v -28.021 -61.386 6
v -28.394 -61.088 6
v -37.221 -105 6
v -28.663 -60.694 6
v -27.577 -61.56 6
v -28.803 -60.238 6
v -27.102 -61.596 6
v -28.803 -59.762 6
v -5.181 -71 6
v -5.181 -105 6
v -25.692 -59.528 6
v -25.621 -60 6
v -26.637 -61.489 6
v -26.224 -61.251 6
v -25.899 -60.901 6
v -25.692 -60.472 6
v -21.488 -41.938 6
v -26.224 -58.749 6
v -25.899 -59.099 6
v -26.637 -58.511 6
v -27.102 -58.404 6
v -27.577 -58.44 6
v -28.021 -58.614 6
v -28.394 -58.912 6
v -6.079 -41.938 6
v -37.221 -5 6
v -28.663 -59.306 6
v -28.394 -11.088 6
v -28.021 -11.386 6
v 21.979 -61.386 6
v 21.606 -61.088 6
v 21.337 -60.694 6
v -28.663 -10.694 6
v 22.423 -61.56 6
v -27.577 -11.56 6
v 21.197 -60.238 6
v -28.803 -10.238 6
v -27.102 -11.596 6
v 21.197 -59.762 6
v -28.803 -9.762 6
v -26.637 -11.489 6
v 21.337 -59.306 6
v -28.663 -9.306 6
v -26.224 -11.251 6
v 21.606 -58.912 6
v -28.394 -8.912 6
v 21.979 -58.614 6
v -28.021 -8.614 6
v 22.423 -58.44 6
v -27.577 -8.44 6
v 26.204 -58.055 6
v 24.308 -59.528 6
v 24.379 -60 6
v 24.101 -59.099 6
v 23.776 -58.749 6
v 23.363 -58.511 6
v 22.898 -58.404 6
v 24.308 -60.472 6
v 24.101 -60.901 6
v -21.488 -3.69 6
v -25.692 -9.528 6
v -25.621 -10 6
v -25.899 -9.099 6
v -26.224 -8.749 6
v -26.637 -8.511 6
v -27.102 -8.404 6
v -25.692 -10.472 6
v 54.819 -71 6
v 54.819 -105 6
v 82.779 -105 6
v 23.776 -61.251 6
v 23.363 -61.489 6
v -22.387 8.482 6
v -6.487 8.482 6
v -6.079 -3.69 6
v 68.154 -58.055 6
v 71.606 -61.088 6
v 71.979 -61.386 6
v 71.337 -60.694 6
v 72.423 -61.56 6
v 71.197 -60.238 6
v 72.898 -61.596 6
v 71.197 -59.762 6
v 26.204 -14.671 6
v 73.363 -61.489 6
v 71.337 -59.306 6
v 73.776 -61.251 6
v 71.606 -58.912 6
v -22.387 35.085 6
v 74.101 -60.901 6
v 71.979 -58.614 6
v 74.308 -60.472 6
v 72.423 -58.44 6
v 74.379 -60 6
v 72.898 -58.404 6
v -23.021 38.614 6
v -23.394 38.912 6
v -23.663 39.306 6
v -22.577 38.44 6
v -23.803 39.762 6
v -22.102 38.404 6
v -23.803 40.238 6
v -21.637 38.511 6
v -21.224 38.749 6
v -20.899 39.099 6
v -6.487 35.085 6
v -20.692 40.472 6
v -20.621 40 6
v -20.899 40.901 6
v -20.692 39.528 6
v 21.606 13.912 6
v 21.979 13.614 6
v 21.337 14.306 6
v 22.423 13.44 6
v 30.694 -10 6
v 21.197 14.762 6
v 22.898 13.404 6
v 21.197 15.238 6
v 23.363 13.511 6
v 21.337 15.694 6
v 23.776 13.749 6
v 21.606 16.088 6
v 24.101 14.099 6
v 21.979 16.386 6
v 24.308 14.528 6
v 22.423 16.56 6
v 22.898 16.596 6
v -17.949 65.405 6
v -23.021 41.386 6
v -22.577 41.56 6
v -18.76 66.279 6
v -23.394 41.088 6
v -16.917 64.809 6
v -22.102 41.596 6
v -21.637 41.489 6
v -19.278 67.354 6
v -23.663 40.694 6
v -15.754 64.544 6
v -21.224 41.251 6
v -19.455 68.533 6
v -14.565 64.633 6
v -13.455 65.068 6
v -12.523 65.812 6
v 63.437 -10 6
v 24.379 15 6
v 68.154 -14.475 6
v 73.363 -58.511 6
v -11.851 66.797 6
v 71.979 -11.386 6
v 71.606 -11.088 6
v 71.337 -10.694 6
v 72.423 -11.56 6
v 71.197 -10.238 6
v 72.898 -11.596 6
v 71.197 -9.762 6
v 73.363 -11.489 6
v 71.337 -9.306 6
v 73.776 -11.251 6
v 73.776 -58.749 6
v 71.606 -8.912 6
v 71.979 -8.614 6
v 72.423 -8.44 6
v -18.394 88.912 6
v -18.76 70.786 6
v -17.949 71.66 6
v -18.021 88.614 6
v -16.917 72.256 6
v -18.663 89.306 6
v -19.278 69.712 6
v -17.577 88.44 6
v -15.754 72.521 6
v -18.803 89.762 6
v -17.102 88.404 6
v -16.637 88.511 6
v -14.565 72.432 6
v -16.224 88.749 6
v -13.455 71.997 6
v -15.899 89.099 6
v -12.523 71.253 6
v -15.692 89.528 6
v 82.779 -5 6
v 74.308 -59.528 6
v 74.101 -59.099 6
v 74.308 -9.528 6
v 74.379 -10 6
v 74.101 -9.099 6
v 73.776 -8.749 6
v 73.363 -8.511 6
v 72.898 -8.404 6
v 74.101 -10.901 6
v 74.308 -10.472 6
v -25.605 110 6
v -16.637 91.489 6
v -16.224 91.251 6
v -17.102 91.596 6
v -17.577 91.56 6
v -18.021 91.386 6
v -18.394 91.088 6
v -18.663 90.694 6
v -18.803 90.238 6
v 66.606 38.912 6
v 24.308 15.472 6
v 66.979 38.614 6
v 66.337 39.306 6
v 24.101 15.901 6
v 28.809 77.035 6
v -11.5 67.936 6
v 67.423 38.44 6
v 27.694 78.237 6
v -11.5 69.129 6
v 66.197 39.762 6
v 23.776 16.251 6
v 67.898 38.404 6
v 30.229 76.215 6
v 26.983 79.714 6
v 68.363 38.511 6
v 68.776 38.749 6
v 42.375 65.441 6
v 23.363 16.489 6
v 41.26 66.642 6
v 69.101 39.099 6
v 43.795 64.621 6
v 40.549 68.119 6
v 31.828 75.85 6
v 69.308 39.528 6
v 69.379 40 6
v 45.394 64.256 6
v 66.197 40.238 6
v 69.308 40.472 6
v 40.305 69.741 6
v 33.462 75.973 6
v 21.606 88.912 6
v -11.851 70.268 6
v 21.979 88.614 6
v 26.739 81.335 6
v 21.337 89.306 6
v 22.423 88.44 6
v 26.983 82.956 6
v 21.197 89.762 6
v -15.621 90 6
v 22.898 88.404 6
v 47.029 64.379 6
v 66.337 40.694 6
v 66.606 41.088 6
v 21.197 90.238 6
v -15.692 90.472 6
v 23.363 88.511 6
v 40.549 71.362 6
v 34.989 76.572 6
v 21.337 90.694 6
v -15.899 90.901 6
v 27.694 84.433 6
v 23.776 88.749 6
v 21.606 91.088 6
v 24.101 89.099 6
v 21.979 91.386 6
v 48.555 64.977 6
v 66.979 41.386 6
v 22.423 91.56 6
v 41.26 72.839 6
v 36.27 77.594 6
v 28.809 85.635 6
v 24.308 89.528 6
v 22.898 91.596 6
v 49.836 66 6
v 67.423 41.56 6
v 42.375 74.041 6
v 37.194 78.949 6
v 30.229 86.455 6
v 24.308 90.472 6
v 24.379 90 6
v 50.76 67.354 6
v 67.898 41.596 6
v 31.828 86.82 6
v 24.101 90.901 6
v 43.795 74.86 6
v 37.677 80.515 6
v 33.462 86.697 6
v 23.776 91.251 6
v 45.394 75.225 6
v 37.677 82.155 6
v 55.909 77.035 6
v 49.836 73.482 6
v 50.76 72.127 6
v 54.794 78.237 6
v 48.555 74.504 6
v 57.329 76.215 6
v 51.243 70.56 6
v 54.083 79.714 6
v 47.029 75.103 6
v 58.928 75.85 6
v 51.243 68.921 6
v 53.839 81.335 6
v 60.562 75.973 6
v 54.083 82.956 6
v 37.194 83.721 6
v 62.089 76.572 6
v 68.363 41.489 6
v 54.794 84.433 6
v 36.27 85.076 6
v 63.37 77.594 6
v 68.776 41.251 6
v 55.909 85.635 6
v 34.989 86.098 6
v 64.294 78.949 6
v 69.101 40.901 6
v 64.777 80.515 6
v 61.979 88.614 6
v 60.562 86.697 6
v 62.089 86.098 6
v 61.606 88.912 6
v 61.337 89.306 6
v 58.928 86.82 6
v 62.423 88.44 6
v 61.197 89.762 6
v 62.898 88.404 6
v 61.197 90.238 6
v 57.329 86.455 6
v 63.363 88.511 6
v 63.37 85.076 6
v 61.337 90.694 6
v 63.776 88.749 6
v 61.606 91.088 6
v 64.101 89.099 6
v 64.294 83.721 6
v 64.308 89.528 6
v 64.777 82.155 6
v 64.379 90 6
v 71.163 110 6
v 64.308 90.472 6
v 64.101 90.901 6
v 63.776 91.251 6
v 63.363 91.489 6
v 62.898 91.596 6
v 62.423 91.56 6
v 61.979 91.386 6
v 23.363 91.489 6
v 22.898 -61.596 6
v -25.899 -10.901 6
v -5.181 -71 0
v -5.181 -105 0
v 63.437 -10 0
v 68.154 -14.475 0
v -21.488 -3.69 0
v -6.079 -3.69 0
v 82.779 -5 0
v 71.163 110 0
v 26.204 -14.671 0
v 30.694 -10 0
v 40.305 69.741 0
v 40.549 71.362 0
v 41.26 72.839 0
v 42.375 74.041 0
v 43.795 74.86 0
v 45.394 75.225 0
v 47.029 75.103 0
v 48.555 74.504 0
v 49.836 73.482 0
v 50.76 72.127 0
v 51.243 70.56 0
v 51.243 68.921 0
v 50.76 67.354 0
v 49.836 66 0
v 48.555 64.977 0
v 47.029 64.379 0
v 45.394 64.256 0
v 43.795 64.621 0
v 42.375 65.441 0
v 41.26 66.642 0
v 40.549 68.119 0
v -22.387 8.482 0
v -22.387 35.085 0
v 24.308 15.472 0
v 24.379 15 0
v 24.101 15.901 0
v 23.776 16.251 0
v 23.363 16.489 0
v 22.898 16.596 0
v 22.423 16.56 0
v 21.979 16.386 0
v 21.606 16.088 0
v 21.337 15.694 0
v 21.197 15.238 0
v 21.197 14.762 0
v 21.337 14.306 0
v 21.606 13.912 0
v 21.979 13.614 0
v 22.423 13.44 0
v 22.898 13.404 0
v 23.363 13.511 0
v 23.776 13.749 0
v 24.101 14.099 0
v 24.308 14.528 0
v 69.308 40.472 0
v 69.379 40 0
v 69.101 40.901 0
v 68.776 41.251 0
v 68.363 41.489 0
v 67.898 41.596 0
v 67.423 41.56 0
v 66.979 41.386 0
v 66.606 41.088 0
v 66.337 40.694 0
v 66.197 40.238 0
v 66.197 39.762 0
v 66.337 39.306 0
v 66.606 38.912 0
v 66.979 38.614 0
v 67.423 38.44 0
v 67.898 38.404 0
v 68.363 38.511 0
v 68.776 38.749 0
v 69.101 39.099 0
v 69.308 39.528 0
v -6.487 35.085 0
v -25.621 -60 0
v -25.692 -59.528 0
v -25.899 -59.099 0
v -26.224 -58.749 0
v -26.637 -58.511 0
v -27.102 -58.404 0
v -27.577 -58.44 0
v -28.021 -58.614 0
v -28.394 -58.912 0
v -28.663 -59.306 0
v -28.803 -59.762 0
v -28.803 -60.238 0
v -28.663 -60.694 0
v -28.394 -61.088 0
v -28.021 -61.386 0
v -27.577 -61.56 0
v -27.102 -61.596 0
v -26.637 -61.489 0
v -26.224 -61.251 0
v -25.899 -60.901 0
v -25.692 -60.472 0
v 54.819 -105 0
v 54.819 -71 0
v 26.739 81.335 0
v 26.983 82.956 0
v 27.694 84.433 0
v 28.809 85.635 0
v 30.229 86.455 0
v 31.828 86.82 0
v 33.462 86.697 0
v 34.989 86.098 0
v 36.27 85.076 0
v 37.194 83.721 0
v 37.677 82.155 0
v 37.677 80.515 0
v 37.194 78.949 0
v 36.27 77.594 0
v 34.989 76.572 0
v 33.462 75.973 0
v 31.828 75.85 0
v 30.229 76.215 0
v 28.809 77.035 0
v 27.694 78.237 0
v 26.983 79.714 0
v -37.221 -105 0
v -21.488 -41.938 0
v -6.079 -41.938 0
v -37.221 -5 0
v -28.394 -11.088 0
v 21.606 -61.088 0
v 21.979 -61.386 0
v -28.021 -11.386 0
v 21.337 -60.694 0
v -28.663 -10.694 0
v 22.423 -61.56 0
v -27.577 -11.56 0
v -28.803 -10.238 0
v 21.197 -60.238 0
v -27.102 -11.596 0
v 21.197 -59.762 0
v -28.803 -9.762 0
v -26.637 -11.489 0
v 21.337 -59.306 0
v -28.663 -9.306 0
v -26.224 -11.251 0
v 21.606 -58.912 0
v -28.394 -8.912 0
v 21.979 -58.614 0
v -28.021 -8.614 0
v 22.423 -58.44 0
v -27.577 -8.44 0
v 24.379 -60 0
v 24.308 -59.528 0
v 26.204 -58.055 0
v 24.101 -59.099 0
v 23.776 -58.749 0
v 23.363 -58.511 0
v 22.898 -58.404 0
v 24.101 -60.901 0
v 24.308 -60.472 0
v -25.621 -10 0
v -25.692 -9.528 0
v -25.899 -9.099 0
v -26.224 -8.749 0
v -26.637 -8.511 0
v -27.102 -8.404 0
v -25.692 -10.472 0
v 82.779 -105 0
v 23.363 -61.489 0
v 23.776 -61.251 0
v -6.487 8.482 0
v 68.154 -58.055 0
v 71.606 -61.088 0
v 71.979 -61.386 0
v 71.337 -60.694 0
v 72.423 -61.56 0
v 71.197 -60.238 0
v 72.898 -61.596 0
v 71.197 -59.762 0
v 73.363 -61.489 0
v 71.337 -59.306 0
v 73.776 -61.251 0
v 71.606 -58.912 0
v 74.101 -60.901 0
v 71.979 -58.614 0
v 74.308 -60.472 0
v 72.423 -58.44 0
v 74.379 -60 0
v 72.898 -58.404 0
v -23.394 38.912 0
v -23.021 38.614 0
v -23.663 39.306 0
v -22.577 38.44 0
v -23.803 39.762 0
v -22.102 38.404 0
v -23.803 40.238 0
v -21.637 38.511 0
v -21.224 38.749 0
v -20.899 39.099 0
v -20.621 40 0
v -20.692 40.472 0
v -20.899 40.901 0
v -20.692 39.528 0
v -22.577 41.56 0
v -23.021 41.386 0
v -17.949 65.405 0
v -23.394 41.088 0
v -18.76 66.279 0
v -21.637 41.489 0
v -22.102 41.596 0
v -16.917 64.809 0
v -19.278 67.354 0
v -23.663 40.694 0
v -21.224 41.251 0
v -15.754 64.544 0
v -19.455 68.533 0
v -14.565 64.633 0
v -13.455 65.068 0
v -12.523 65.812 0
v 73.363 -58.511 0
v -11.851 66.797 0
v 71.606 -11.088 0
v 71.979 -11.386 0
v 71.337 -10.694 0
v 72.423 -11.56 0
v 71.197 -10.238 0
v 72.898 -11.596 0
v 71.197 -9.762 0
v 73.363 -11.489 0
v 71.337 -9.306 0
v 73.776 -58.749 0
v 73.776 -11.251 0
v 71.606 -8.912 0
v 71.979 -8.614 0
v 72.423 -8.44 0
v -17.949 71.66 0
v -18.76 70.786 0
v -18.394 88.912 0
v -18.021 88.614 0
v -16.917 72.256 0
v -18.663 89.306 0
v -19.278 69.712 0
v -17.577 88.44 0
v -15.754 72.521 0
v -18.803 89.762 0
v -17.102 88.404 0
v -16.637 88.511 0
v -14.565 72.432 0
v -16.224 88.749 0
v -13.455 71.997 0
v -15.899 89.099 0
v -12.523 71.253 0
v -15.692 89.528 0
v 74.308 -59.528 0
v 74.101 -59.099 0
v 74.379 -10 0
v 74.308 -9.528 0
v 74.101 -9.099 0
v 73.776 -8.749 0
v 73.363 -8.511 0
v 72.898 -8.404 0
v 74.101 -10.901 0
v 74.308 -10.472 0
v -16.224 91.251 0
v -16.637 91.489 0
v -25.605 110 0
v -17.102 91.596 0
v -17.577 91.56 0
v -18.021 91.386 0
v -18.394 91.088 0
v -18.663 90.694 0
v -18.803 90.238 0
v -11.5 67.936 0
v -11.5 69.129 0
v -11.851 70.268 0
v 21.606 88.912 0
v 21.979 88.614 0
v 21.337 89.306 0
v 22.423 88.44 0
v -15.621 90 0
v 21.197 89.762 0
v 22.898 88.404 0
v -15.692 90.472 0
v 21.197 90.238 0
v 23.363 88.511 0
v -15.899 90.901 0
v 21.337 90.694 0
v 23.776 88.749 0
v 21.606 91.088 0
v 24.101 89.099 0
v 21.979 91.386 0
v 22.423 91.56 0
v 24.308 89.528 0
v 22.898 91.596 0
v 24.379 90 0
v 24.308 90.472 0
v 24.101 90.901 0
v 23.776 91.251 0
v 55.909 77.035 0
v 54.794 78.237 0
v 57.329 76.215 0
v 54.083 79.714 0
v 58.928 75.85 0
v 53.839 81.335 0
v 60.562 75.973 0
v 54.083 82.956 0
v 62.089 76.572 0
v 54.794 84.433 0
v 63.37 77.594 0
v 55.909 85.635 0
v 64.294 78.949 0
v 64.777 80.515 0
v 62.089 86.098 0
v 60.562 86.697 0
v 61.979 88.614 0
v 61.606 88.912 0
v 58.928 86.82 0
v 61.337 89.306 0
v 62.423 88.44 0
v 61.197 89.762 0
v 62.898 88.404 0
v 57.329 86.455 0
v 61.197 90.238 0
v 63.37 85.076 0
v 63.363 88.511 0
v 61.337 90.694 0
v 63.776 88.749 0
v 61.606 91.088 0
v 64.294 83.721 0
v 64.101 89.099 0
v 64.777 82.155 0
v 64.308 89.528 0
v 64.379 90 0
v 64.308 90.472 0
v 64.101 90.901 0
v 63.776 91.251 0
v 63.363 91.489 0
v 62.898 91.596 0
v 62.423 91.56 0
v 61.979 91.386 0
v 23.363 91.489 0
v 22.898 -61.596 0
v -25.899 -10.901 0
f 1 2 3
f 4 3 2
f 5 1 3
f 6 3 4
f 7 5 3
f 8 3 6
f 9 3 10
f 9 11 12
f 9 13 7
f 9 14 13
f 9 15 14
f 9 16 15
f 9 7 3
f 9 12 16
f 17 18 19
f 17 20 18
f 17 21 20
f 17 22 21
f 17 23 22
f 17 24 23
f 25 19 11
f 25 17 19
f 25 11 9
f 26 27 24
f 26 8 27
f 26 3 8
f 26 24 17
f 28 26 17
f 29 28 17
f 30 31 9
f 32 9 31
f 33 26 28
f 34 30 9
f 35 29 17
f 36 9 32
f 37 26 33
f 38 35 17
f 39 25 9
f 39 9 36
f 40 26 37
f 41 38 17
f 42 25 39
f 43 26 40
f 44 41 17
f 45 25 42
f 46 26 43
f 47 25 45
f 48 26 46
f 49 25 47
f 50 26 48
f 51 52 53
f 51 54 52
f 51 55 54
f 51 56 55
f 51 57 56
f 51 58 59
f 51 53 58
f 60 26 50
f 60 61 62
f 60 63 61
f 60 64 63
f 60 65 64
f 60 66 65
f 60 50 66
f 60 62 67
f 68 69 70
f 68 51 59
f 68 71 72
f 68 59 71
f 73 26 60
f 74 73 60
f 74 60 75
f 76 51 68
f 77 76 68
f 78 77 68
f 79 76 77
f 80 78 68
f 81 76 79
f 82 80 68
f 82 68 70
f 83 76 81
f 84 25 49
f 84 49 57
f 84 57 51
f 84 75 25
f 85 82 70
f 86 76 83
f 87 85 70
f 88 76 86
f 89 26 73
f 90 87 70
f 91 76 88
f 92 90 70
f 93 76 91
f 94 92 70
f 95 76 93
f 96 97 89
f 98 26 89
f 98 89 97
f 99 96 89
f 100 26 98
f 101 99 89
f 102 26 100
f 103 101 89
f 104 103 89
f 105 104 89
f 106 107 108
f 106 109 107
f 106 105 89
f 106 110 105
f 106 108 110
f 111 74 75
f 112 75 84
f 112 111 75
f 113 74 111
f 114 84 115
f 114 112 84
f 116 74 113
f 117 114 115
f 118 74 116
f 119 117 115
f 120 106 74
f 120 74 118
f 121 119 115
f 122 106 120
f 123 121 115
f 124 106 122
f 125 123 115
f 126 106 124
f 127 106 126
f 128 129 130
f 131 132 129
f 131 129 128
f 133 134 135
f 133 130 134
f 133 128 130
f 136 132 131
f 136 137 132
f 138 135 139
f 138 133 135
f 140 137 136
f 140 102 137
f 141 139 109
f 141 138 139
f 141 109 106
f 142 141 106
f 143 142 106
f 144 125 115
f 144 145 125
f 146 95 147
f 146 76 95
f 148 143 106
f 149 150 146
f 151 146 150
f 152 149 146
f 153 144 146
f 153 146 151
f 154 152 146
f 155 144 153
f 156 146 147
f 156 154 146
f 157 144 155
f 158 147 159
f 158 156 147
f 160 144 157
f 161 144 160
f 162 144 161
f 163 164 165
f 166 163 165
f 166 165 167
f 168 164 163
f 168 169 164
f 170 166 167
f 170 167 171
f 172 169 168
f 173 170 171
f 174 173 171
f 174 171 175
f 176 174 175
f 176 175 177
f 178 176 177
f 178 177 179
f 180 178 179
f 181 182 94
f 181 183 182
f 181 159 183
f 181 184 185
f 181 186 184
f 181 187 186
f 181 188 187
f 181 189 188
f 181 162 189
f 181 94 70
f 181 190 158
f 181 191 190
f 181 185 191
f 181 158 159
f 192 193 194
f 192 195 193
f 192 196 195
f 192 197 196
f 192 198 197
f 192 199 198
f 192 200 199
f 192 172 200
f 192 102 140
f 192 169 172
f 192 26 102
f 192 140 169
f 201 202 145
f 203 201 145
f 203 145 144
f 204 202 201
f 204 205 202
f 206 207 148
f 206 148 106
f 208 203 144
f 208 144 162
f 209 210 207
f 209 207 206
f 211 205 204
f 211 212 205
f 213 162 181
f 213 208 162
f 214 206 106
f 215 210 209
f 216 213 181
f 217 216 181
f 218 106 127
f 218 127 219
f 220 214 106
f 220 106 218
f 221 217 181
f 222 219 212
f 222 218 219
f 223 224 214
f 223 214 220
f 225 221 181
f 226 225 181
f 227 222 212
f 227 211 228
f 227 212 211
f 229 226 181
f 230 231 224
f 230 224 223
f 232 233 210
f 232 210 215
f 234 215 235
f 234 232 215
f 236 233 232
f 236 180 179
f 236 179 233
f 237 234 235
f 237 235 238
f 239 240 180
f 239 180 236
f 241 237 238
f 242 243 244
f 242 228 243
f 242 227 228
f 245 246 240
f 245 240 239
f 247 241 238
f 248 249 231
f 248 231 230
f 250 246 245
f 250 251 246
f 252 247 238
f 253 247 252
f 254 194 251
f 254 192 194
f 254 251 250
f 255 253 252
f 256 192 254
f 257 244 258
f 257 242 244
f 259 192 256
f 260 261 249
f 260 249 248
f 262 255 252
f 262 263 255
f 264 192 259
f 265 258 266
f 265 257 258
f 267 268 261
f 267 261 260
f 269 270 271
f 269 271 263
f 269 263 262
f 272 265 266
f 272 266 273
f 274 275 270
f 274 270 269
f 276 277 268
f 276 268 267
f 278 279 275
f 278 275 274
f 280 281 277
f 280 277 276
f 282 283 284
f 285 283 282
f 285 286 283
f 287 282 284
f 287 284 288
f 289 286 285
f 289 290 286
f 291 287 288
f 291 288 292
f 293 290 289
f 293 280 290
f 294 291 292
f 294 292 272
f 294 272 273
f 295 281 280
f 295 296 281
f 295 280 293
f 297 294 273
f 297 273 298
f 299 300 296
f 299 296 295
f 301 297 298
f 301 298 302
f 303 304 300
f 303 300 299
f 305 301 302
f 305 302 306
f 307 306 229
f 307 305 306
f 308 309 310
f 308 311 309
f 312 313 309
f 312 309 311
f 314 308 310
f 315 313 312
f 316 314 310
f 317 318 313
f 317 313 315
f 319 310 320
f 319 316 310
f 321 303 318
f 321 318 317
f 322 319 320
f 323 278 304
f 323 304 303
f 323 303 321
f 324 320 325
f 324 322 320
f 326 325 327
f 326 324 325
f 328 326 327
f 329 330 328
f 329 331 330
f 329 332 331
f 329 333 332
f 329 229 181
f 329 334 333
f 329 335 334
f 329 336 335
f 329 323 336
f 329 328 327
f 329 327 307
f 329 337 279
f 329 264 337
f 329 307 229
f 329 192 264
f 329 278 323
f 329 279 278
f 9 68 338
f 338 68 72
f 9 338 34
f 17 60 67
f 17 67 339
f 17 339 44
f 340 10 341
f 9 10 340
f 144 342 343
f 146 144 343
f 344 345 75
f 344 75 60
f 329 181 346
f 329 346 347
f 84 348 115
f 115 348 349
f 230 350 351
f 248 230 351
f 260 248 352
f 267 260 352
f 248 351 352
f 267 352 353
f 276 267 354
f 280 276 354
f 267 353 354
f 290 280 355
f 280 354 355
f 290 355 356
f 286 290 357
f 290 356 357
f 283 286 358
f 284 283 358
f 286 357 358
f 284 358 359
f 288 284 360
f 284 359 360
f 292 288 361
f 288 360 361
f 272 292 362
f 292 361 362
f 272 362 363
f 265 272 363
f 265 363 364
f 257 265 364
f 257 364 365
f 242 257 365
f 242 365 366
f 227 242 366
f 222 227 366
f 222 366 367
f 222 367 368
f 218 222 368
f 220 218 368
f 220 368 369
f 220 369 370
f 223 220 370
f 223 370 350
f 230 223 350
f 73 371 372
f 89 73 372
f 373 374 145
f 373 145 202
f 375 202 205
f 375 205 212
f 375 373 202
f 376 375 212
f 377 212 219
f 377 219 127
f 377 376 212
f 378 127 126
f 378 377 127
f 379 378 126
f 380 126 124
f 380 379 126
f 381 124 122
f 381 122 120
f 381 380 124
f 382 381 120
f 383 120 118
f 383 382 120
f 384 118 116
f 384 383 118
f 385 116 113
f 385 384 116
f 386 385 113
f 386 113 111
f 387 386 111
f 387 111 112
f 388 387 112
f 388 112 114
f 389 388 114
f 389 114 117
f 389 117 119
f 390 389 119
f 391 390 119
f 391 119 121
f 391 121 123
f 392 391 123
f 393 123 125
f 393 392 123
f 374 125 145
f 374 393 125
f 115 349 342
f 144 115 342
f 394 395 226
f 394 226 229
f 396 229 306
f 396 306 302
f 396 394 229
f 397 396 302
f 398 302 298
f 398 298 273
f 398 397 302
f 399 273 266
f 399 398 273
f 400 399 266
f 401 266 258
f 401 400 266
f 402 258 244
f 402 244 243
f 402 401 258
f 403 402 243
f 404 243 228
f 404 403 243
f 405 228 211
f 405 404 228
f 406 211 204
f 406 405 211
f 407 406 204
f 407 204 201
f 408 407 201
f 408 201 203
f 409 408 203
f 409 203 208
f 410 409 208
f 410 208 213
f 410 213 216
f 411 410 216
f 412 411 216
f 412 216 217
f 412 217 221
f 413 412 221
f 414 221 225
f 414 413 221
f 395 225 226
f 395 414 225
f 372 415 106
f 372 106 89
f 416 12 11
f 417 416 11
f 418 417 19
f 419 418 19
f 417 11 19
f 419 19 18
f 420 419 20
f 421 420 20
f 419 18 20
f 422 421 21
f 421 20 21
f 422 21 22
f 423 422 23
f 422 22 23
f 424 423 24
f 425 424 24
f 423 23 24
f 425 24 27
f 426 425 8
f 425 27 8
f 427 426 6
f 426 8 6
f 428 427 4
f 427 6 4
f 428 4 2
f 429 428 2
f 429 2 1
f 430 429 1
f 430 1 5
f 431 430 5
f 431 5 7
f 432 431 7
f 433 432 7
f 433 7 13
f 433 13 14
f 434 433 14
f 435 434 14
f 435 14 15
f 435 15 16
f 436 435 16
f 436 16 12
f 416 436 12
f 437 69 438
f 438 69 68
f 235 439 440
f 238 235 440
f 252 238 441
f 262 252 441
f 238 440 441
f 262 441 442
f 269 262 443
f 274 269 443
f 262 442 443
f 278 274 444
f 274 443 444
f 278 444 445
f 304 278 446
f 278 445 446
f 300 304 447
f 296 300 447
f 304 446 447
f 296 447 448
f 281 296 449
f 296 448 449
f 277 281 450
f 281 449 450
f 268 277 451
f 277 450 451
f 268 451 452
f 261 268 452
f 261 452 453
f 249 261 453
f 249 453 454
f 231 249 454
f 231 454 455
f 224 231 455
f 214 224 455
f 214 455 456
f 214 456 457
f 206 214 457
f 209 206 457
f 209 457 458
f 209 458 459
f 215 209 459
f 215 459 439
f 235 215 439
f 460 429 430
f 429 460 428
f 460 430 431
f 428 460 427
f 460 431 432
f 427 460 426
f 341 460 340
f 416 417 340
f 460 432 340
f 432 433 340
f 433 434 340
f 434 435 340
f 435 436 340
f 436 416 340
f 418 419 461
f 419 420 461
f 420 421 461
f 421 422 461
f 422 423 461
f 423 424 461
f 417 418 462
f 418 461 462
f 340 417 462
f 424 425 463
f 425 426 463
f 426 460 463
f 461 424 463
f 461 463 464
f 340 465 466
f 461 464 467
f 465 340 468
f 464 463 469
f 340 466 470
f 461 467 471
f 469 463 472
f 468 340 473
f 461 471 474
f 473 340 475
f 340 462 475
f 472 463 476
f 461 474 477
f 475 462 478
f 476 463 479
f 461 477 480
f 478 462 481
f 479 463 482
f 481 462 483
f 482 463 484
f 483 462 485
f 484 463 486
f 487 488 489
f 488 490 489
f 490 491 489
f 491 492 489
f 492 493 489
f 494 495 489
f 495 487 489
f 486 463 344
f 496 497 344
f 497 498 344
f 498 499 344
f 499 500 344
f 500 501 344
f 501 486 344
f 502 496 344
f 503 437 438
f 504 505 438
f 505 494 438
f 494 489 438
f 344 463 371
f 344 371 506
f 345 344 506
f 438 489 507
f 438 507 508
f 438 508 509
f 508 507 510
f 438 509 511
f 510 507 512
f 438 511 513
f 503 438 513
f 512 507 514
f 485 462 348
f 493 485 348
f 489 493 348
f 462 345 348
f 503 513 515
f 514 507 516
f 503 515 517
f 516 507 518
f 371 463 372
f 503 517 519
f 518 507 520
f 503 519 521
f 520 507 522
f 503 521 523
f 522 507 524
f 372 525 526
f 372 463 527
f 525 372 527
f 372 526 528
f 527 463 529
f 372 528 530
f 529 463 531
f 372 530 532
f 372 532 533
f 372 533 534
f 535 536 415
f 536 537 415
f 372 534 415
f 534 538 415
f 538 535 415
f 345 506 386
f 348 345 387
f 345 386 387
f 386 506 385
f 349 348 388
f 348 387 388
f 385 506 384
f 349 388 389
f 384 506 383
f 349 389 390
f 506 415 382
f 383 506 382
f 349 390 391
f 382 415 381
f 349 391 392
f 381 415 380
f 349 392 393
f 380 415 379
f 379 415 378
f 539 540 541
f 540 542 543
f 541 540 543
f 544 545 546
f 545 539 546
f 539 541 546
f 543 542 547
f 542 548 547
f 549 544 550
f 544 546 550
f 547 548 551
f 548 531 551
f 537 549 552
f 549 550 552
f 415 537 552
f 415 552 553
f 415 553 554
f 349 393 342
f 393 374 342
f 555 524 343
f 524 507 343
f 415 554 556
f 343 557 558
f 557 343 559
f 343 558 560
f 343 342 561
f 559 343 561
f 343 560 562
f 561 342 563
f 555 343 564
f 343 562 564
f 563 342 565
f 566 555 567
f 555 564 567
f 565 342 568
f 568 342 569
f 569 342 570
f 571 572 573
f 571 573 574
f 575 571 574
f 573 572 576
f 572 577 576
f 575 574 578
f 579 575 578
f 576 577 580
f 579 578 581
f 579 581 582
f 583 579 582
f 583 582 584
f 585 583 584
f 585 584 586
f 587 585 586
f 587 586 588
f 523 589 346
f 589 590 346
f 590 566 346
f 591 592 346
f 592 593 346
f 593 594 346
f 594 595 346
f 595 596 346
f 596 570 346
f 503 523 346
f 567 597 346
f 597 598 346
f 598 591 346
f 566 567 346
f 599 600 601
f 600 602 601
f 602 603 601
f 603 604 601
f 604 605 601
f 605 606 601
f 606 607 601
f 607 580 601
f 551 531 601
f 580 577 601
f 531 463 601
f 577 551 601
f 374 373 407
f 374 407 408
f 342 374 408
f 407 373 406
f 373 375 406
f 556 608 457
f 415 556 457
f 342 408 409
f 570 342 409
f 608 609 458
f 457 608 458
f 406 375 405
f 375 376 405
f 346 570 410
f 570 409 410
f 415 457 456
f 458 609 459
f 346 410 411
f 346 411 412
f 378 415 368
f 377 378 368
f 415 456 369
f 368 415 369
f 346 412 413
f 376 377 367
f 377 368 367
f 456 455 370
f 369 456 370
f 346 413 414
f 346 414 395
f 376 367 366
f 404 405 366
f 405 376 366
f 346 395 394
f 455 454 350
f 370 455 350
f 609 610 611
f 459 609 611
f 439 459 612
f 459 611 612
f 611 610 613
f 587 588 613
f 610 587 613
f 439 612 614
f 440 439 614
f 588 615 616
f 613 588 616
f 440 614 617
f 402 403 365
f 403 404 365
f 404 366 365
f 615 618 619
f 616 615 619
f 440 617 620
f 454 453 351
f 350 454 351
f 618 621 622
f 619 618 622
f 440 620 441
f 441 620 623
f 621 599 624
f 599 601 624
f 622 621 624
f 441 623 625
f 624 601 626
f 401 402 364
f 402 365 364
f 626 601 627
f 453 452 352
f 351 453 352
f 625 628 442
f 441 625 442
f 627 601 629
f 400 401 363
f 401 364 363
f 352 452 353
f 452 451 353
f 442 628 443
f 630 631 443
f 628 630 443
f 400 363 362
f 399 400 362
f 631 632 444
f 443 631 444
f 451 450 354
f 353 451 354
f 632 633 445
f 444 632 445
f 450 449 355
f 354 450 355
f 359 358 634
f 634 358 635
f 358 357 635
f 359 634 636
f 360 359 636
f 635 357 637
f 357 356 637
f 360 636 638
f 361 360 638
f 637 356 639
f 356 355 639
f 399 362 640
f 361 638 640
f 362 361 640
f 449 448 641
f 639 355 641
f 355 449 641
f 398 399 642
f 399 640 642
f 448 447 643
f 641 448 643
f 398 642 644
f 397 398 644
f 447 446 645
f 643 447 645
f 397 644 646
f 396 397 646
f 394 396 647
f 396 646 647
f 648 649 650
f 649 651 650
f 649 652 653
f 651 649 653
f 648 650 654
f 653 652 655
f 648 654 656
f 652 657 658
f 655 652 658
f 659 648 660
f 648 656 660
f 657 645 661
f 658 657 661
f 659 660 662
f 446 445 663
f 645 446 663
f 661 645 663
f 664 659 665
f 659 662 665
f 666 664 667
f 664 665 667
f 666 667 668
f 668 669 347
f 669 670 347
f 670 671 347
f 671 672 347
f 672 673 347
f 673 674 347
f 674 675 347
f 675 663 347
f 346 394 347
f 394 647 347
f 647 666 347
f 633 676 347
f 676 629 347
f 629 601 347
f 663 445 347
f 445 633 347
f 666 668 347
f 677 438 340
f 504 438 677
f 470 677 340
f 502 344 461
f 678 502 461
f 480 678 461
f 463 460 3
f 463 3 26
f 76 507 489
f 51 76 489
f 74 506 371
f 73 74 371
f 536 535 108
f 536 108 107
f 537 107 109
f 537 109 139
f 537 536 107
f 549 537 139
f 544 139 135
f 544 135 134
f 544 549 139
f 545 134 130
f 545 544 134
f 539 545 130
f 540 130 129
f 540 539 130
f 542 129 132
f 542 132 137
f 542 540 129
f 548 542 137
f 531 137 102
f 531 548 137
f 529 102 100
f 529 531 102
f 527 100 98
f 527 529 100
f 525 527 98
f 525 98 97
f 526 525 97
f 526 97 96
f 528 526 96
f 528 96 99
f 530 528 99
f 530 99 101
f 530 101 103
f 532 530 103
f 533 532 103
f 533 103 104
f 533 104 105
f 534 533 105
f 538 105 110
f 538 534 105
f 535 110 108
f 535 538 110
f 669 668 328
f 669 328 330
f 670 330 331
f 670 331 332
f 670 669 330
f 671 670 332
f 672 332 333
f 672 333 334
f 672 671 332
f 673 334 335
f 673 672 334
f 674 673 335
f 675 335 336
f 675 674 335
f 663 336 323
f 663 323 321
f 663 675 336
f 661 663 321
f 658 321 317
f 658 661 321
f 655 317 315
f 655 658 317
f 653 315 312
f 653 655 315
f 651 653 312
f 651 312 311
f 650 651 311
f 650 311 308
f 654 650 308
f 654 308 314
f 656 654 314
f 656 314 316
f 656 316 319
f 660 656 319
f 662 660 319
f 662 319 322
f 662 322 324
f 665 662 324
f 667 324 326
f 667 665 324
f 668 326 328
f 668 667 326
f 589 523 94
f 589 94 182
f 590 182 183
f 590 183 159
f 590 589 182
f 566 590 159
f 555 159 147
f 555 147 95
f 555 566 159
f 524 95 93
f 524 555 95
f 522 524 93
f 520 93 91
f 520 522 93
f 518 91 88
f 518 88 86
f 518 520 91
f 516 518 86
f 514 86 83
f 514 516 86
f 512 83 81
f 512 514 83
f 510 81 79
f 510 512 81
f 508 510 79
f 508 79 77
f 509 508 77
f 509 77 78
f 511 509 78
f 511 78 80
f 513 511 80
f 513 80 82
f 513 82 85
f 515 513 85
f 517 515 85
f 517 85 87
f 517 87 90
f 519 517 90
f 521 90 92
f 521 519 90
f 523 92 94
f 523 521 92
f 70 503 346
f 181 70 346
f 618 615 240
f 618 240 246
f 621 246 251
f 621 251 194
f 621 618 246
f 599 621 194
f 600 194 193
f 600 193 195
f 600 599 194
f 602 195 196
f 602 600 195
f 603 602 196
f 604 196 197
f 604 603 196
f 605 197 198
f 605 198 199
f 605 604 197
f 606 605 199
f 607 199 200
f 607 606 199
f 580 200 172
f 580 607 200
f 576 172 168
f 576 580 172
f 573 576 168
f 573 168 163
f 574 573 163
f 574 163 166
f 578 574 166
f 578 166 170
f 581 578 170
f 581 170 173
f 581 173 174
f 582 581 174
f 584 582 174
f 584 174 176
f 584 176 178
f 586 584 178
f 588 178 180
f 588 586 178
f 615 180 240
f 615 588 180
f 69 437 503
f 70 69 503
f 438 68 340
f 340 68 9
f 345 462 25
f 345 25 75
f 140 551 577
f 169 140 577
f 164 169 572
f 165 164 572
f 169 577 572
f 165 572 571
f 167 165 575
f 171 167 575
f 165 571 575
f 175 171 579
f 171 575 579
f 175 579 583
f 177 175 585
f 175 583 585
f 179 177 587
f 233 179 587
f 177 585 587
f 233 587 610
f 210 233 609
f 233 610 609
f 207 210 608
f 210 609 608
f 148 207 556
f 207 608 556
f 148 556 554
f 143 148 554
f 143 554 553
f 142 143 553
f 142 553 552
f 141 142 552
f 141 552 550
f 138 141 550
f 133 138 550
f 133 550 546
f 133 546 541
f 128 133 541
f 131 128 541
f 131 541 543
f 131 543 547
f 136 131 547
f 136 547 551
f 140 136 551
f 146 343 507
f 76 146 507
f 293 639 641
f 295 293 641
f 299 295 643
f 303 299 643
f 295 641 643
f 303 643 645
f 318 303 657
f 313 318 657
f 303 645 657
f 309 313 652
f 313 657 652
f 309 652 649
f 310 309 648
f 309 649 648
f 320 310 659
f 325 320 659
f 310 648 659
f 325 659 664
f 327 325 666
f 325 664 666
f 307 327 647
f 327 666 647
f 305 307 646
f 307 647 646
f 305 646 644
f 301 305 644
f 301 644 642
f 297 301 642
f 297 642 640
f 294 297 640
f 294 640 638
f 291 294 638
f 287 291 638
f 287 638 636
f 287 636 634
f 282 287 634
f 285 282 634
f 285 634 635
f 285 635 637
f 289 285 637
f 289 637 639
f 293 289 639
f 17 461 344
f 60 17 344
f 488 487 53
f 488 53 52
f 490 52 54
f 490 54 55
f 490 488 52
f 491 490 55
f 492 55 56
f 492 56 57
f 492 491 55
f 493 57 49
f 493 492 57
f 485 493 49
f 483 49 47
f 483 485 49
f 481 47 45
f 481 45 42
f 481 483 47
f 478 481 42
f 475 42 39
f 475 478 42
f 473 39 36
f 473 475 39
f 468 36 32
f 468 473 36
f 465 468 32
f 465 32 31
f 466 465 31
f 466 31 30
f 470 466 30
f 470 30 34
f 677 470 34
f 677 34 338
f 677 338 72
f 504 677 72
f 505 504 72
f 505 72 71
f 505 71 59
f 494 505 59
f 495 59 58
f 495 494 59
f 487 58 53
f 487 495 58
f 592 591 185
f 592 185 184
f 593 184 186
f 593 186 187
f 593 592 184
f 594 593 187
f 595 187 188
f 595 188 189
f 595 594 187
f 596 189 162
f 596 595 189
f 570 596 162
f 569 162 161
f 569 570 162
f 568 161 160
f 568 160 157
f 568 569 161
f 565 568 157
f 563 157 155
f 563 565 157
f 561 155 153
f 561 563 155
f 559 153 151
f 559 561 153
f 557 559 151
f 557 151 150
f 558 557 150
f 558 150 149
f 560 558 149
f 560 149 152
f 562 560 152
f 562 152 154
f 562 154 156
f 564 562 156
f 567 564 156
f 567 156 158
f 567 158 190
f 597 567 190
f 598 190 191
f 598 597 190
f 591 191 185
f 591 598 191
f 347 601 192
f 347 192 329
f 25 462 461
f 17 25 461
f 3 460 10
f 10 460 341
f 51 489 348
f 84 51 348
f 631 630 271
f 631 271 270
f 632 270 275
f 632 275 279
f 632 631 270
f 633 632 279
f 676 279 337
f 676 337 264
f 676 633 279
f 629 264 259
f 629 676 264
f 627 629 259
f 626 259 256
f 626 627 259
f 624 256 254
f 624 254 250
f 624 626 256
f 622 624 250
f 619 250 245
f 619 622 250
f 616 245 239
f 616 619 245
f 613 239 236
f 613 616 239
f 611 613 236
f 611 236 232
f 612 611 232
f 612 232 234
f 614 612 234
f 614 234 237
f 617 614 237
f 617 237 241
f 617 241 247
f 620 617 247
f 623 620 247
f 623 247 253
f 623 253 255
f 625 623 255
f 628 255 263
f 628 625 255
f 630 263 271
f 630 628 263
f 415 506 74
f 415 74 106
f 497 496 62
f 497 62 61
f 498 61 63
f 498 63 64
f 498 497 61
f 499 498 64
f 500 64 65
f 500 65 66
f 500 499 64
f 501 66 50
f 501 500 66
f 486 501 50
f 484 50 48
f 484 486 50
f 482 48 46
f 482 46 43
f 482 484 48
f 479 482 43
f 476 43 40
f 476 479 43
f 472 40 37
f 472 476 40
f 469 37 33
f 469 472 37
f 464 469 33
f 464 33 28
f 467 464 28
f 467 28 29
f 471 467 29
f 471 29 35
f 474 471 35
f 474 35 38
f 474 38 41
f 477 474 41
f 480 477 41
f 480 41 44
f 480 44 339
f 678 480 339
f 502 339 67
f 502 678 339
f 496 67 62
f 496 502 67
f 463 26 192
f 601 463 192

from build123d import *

# Parameters (mm, degrees)
ESQUISSE1_W                    = 120
ESQUISSE1_H                    = 215
BOSS_EXTRU_1_DEPTH             = 6
ESQUISSE2_R                    = 1.6
ENL_V_MAT_EXTRU_1_DEPTH        = 138.798088748
R_P_TITION_LIN_AIRE1_OUTLINE_R = 1.6
R_P_TITION_LIN_AIRE1_DEPTH     = 6
ESQUISSE3_R                    = 4
ESQUISSE3_R_2                  = 5.5
ESQUISSE3_W                    = 15.409626965
ESQUISSE3_H                    = 38.248473635
ESQUISSE3_W_2                  = 15.900745579
ESQUISSE3_H_2                  = 26.603255198
ENL_V_MAT_EXTRU_2_DEPTH        = 138.798088748
ENL_V_MAT_EXTRU_3_DEPTH        = 138.798088748
ENL_V_MAT_EXTRU_4_DEPTH        = 138.798088748
ENL_V_MAT_EXTRU_4_DEPTH_BACK   = 138.798088748
ESQUISSE5_W                    = 60
ESQUISSE5_H                    = 33.99999972


# Read off the part's stored shape, not the designer's step: Répétition linéaire1
with BuildPart() as part:
    # Esquisse1 → Boss.-Extru.1 (new body)
    with BuildSketch(Plane.XY):
        with Locations((22.778700537, 2.5)):
            Rectangle(ESQUISSE1_W, ESQUISSE1_H)
    extrude(amount=BOSS_EXTRU_1_DEPTH)

    # Esquisse2 → Enlèv. mat.-Extru.1 (cut, through all)
    with BuildSketch(Plane.XY.offset(6)):
        with Locations((-27.221299463, -60)):
            Circle(ESQUISSE2_R)
    extrude(amount=-ENL_V_MAT_EXTRU_1_DEPTH, mode=Mode.SUBTRACT)

    # Répétition linéaire1 outline → Répétition linéaire1 (cut)
    with BuildSketch(Plane.XY):
        with Locations((-27.221299463, -10)):
            Circle(R_P_TITION_LIN_AIRE1_OUTLINE_R)
        with Locations((-22.221299463, 40)):
            Circle(R_P_TITION_LIN_AIRE1_OUTLINE_R)
        with Locations((-17.221299463, 90)):
            Circle(R_P_TITION_LIN_AIRE1_OUTLINE_R)
        with Locations((22.778700537, -60)):
            Circle(R_P_TITION_LIN_AIRE1_OUTLINE_R)
        with Locations((22.778700537, 15)):
            Circle(R_P_TITION_LIN_AIRE1_OUTLINE_R)
        with Locations((62.778700537, 90)):
            Circle(R_P_TITION_LIN_AIRE1_OUTLINE_R)
        with Locations((67.778700537, 40)):
            Circle(R_P_TITION_LIN_AIRE1_OUTLINE_R)
        with Locations((72.778700537, -10)):
            Circle(R_P_TITION_LIN_AIRE1_OUTLINE_R)
        with Locations((72.778700537, -60)):
            Circle(R_P_TITION_LIN_AIRE1_OUTLINE_R)
        with Locations((22.778700537, 90)):
            Circle(R_P_TITION_LIN_AIRE1_OUTLINE_R)
    extrude(amount=R_P_TITION_LIN_AIRE1_DEPTH, mode=Mode.SUBTRACT)

    # Esquisse3 → Enlèv. mat.-Extru.2 (cut, through all)
    with BuildSketch(Plane(origin=(0, 0, 0), x_dir=(-1, 0, 0), z_dir=(0, 0, -1))):
        with Locations((15.455236492, 68.53256443)):
            Circle(ESQUISSE3_R)
        with Locations((-32.238615261, 81.334914602)):
            Circle(ESQUISSE3_R_2)
        with Locations((-59.338617549, 81.334914602)):
            Circle(ESQUISSE3_R_2)
        with Locations((-45.804685817, 69.740615286)):
            Circle(ESQUISSE3_R_2)
        Polygon((-68.153753001, -58.054646), (-26.204418495, -58.054646), (-26.204418495, -14.671183794), (-30.693922011, -10.00000011), (-63.437167878, -10.00000011), (-68.153753001, -14.47508178), align=None)
        with Locations((13.783655533, -22.813946783)):
            Rectangle(ESQUISSE3_W, ESQUISSE3_H)
        with Locations((14.437094465, 21.783177691)):
            Rectangle(ESQUISSE3_W_2, ESQUISSE3_H_2)
        with BuildLine():
            Line((-30.778700537, -101), (-30.778700537, -105))
            Line((-30.778700537, -105), (-14.778700537, -105))
            Line((-14.778700537, -105), (-14.778700537, -101))
            ThreePointArc((-14.778700537, -101), (-22.778700537, -93), (-30.778700537, -101))
        make_face()
    extrude(amount=-ENL_V_MAT_EXTRU_2_DEPTH, mode=Mode.SUBTRACT)

    # Esquisse4 → Enlèv. mat.-Extru.3 (cut, through all)
    with BuildSketch(Plane.XY.offset(6)):
        Polygon((-37.221299463, 110), (-37.221299463, -5.00000078), (-25.60513741, 110), align=None)
        Polygon((71.162538485, 110), (82.778700537, 110), (82.778700537, -5.00000078), align=None)
    extrude(amount=-ENL_V_MAT_EXTRU_3_DEPTH, mode=Mode.SUBTRACT)

    # Esquisse5 → Enlèv. mat.-Extru.4 (cut, two sides: drawn at the far end of the back side and taken through both)
    with BuildSketch(Plane(origin=(0, 0, 0), x_dir=(-1, 0, 0), z_dir=(0, 0, -1)).offset(-ENL_V_MAT_EXTRU_4_DEPTH_BACK)):
        with Locations((-24.818757264, -88.00000014)):
            Rectangle(ESQUISSE5_W, ESQUISSE5_H)
    extrude(amount=ENL_V_MAT_EXTRU_4_DEPTH + ENL_V_MAT_EXTRU_4_DEPTH_BACK, mode=Mode.SUBTRACT)


solid = part.part
